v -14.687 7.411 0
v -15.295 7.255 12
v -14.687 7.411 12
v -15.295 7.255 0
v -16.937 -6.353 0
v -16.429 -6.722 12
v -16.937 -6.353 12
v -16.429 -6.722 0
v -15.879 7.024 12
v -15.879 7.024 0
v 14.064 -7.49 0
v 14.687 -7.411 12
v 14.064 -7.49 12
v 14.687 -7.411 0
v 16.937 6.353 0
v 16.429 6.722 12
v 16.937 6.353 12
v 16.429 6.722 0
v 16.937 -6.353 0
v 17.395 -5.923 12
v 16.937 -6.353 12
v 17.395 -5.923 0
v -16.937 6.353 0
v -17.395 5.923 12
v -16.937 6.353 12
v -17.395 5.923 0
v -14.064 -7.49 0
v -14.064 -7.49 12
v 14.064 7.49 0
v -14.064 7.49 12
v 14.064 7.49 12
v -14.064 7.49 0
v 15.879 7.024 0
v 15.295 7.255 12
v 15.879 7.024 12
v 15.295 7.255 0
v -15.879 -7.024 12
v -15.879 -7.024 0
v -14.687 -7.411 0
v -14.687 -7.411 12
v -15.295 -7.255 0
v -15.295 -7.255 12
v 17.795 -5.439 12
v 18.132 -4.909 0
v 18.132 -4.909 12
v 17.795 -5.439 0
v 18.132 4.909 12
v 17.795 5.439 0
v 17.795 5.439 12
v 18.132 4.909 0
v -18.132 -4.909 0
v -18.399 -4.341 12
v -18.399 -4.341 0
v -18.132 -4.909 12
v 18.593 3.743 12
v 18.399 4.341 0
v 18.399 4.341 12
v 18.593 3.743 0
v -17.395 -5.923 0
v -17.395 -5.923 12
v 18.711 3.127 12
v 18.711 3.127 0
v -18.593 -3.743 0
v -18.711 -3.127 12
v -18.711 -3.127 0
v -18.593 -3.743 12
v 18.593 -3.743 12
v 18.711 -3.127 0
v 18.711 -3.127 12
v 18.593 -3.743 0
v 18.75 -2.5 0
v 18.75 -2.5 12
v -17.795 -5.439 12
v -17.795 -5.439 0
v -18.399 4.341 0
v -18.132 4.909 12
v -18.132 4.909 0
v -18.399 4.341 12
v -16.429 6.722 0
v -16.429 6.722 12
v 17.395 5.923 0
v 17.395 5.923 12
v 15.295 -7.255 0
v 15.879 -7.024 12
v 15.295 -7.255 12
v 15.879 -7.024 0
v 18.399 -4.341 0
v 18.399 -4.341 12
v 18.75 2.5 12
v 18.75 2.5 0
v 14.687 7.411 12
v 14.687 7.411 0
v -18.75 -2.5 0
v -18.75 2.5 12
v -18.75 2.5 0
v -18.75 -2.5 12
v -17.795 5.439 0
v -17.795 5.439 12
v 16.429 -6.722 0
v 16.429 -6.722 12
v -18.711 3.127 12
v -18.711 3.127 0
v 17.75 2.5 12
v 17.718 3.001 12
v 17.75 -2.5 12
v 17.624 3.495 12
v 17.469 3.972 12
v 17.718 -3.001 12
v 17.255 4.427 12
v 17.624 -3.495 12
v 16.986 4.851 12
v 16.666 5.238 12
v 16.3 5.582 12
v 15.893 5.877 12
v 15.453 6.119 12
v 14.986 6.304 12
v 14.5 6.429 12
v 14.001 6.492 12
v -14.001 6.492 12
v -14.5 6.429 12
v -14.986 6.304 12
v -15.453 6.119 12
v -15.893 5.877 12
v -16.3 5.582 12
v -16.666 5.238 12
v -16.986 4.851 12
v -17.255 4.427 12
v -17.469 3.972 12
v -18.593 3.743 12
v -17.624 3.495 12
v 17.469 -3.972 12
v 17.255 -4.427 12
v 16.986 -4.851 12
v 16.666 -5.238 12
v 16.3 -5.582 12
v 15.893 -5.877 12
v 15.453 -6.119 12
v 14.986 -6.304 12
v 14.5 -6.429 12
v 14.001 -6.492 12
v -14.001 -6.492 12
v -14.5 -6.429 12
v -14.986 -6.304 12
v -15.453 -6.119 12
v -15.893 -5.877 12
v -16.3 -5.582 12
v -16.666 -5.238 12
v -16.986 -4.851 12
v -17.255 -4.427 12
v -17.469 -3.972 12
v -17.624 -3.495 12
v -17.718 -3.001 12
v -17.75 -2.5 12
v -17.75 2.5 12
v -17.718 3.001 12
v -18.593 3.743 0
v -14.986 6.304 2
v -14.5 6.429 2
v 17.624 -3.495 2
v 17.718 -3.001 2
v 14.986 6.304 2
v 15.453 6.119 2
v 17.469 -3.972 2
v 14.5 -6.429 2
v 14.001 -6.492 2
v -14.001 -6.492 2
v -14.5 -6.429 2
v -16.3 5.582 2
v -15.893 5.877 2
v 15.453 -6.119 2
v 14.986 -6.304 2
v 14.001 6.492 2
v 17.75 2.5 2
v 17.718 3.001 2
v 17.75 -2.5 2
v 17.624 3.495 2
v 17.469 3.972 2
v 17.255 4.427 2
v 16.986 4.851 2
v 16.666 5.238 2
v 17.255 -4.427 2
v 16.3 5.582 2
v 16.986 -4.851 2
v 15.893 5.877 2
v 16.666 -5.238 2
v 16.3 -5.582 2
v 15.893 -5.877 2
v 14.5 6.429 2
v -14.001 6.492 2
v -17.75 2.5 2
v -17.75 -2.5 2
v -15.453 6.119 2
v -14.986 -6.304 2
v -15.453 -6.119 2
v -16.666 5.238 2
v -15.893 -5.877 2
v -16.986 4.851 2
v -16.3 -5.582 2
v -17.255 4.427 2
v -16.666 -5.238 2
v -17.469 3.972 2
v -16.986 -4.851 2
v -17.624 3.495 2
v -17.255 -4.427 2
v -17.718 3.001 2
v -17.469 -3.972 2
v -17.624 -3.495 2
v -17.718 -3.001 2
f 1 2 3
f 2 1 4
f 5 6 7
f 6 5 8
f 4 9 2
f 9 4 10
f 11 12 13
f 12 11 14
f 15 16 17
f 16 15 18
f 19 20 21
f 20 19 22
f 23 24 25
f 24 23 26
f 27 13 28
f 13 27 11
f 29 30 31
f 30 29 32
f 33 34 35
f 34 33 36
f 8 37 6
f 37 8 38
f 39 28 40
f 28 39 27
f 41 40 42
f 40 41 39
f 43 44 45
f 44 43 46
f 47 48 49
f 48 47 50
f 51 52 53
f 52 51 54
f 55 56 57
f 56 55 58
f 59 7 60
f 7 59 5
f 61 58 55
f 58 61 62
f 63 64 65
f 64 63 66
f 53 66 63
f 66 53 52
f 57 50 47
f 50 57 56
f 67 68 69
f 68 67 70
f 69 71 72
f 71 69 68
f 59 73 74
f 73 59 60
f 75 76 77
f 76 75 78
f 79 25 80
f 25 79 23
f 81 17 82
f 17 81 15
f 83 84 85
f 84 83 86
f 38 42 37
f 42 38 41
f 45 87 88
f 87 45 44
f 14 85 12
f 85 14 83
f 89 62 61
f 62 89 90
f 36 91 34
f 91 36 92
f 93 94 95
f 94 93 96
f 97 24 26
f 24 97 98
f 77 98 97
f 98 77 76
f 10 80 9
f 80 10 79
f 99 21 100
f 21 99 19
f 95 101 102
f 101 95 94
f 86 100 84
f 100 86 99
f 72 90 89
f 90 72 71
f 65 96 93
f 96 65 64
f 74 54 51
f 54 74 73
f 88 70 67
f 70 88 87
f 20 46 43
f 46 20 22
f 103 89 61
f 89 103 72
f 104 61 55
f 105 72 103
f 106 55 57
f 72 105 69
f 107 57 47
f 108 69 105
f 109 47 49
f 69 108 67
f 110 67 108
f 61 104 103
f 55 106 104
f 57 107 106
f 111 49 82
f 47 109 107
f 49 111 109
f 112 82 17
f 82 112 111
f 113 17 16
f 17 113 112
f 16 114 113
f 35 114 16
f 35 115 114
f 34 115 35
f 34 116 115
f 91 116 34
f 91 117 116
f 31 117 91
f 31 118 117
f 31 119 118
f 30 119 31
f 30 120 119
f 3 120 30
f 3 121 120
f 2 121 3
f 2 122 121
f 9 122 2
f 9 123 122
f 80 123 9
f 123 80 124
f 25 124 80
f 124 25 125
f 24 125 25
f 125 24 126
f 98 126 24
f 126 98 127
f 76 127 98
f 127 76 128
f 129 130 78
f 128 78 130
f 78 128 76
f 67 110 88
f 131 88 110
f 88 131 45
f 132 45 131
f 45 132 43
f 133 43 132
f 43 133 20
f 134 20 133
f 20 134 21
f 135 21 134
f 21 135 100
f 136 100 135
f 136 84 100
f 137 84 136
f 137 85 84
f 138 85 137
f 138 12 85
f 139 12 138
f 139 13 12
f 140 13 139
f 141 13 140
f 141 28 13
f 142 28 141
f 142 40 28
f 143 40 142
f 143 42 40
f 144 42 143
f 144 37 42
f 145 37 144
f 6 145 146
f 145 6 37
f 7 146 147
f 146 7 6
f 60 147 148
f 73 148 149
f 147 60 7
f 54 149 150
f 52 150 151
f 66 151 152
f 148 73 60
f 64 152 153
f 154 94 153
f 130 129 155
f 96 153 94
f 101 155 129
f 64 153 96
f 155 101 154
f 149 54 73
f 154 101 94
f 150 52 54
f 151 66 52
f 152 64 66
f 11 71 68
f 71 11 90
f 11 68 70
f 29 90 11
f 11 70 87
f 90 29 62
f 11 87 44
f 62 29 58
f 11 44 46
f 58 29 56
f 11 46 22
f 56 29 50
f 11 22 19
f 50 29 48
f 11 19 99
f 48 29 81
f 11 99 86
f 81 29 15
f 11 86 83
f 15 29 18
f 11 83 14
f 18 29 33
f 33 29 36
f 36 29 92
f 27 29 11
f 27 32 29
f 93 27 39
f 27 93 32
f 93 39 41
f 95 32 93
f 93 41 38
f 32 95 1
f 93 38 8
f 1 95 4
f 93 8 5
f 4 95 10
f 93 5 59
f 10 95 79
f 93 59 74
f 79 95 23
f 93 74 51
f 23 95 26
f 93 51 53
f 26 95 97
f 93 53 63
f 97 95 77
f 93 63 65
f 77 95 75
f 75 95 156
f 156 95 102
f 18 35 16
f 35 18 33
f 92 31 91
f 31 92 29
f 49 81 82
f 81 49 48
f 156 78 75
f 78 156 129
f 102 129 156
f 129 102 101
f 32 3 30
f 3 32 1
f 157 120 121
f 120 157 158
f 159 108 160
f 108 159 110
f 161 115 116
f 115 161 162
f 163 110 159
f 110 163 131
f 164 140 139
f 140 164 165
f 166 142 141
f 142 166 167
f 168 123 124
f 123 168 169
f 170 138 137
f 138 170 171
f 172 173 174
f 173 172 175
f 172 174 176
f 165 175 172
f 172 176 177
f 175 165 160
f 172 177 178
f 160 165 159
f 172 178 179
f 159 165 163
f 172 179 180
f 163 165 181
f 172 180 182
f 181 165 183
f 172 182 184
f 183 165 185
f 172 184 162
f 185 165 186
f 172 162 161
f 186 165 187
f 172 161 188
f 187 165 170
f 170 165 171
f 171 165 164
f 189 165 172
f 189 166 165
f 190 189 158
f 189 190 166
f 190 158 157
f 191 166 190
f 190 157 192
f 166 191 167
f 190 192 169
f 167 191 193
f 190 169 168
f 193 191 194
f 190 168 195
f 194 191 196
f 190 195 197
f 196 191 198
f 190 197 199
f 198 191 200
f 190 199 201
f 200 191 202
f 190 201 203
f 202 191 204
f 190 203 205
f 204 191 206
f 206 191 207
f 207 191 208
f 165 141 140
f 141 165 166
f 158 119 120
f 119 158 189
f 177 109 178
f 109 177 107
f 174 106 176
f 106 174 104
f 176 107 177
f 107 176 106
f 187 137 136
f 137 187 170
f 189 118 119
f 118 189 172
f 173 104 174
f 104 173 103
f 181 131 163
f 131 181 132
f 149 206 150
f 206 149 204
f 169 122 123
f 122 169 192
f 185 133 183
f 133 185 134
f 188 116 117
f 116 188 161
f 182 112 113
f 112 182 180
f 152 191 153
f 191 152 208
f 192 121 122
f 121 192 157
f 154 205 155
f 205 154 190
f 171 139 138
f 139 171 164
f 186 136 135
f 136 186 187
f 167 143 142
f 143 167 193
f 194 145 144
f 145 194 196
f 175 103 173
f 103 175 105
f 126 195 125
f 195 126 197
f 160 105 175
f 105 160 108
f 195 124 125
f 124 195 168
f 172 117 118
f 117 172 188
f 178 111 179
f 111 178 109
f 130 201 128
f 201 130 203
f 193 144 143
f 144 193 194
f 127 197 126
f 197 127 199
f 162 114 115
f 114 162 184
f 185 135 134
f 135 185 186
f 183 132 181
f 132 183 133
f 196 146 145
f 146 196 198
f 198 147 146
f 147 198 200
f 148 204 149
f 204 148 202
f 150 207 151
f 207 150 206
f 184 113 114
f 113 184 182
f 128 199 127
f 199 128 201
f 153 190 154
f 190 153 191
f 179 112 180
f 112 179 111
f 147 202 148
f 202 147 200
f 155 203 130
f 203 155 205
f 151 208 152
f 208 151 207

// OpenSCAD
$fn = 50;


difference() {
	union() {
		hull() {
			translate(v = [-13.7500000000, 2.5000000000, 0]) {
				cylinder(h = 12, r = 5);
			}
			translate(v = [13.7500000000, 2.5000000000, 0]) {
				cylinder(h = 12, r = 5);
			}
			translate(v = [-13.7500000000, -2.5000000000, 0]) {
				cylinder(h = 12, r = 5);
			}
			translate(v = [13.7500000000, -2.5000000000, 0]) {
				cylinder(h = 12, r = 5);
			}
		}
	}
	union() {
		translate(v = [0, 0, 2]) {
			hull() {
				translate(v = [-13.7500000000, 2.5000000000, 0]) {
					cylinder(h = 10, r = 4);
				}
				translate(v = [13.7500000000, 2.5000000000, 0]) {
					cylinder(h = 10, r = 4);
				}
				translate(v = [-13.7500000000, -2.5000000000, 0]) {
					cylinder(h = 10, r = 4);
				}
				translate(v = [13.7500000000, -2.5000000000, 0]) {
					cylinder(h = 10, r = 4);
				}
			}
		}
	}
}
